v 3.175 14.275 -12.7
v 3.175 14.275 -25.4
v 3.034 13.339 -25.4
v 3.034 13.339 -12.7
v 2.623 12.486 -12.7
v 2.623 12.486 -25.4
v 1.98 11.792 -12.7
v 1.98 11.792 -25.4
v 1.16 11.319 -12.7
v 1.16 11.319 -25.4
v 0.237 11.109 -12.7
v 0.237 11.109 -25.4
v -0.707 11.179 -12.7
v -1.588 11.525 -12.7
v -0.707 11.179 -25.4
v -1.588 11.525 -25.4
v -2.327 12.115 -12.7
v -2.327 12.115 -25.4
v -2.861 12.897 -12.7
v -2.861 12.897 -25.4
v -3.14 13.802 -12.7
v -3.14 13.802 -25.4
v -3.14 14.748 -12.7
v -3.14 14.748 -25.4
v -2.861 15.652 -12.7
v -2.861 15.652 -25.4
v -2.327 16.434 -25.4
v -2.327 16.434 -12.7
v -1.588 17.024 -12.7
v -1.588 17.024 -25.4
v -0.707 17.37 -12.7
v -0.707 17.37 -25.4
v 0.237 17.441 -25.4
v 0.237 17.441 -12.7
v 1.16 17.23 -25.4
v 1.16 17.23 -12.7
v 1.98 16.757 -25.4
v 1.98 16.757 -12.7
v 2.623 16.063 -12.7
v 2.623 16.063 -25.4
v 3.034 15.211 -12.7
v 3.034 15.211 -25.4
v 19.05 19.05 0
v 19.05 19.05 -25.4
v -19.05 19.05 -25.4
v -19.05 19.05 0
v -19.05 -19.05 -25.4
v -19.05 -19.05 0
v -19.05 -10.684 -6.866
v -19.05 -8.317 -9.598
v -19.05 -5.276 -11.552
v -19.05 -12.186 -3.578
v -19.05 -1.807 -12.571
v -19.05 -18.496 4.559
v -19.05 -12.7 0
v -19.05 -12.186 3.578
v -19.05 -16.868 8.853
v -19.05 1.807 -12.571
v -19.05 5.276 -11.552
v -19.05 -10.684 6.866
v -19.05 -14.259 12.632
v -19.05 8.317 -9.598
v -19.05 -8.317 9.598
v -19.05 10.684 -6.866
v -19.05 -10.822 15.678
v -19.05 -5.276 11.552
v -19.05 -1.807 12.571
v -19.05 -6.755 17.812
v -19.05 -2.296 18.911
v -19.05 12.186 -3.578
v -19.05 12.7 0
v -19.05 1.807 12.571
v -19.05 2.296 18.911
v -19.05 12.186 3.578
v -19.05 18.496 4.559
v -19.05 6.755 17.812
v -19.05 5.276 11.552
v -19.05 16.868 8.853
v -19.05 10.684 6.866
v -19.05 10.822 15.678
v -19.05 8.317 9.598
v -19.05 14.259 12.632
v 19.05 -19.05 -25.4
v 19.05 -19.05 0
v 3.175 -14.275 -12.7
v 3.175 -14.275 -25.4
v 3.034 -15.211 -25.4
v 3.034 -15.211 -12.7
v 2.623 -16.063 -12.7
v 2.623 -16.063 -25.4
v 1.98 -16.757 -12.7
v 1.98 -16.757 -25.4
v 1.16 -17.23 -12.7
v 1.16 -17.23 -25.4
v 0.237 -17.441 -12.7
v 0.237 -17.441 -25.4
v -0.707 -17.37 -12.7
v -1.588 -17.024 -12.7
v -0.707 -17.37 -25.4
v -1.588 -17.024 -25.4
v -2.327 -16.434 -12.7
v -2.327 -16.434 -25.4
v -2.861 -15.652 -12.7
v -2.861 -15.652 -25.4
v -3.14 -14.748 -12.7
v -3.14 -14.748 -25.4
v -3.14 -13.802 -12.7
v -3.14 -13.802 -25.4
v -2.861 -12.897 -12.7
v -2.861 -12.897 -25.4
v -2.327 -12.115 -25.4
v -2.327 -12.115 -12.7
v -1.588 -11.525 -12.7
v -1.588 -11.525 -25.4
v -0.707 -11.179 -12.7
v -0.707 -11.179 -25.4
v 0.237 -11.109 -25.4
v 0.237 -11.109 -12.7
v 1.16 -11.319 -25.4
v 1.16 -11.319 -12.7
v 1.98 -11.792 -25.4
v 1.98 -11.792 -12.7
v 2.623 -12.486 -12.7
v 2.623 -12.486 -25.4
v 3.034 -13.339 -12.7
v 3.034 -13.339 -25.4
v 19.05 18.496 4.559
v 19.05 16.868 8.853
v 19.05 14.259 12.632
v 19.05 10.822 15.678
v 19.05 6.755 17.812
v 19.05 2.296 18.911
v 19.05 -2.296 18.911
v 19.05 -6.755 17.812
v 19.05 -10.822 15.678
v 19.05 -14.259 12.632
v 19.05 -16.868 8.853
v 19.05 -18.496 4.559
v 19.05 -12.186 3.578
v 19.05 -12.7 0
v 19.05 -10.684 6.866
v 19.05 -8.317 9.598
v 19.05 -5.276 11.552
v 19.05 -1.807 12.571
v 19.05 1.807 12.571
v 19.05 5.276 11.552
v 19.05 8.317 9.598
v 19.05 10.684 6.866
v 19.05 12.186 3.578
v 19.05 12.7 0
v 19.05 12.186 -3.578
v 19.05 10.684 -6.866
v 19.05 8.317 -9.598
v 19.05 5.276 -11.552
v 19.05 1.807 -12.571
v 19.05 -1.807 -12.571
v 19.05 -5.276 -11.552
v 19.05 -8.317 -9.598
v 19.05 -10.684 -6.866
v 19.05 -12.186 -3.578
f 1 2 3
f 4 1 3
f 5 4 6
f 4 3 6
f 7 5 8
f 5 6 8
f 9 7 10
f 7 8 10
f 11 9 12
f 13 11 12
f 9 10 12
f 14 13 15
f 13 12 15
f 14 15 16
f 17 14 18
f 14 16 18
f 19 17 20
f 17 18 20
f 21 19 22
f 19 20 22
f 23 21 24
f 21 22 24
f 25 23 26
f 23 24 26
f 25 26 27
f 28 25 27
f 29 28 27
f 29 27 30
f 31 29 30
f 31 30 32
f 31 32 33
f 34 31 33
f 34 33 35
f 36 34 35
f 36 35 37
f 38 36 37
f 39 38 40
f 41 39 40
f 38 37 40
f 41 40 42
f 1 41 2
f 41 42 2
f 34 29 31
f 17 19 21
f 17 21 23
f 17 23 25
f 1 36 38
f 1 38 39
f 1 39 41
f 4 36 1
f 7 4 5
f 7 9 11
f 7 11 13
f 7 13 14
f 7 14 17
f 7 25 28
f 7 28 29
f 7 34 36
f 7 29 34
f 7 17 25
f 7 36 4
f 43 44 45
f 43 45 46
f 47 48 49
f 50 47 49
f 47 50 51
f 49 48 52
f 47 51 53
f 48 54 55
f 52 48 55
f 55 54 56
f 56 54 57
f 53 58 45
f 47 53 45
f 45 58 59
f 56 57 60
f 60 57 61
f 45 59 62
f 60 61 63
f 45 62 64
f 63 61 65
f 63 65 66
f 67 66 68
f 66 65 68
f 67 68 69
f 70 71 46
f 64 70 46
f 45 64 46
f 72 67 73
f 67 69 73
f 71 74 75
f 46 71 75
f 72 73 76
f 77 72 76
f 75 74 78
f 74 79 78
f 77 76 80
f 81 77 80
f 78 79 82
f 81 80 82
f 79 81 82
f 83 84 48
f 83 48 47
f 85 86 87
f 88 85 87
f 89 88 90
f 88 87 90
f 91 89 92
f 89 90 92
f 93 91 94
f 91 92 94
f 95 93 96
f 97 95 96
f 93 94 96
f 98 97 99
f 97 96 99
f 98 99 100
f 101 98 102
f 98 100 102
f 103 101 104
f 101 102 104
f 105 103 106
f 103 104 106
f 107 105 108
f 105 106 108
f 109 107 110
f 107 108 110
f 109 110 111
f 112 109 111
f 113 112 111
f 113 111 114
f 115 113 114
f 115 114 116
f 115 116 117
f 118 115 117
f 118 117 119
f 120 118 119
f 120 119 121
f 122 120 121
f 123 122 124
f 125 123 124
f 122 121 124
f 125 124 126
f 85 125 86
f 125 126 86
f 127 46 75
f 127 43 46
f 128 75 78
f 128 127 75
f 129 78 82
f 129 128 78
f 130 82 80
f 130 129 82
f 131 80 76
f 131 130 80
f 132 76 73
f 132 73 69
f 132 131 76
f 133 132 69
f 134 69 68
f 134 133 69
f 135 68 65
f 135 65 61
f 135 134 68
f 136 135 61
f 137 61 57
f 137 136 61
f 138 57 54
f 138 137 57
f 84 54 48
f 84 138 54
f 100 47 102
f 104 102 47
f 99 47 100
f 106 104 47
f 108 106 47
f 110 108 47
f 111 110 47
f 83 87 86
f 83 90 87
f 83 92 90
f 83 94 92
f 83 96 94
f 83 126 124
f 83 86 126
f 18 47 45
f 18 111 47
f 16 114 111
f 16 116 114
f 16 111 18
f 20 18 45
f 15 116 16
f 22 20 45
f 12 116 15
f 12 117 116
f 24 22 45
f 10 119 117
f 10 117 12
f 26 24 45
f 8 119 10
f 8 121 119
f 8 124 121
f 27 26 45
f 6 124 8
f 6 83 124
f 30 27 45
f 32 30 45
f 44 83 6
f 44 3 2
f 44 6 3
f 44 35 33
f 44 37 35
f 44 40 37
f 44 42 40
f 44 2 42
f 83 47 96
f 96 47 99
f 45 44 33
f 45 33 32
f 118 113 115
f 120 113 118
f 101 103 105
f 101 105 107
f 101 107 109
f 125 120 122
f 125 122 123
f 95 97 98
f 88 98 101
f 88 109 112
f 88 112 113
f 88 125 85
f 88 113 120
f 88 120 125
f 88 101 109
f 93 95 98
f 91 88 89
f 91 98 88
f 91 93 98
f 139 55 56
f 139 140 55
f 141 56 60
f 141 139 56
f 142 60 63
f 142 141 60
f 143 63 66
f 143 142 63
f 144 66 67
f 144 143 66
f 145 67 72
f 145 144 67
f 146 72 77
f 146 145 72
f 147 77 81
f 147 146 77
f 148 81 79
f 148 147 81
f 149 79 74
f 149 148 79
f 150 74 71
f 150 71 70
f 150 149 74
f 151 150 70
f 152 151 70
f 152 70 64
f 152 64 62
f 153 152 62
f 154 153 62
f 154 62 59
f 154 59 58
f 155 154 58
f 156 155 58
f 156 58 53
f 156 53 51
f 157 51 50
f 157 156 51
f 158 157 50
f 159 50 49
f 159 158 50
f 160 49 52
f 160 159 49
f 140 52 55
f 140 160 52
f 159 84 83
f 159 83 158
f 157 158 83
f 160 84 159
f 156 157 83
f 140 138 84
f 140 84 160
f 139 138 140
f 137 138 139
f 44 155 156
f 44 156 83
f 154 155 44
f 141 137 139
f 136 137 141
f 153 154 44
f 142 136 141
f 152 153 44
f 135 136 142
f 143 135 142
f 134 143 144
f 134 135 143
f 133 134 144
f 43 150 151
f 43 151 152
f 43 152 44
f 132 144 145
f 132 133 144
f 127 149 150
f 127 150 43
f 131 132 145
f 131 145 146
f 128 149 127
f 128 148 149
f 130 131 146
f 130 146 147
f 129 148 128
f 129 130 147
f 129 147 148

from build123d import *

# Parameters (mm, degrees)
F1_DEPTH = 19.05
F2_R     = 3.175
F3_DEPTH = 12.7


with BuildPart() as f1:
    # F0 (on Right) → F1 (new body, symmetric)
    with BuildSketch(Plane.YZ):
        with BuildLine():
            Line((19.05, 0), (12.7, 0))
            ThreePointArc((12.7, 0), (0, -12.7), (-12.7, 0))
            Line((-12.7, 0), (-19.05, 0))
            ThreePointArc((-19.05, 0), (0, -19.05), (19.05, 0))
        make_face()
        with BuildLine():
            ThreePointArc((-12.7, 0), (0, 12.7), (12.7, 0))
            Line((12.7, 0), (19.05, 0))
            ThreePointArc((19.05, 0), (0, 19.05), (-19.05, 0))
            Line((-19.05, 0), (-12.7, 0))
        make_face()
        with BuildLine():
            Line((19.05, -25.4), (19.05, 0))
            ThreePointArc((19.05, 0), (0, -19.05), (-19.05, 0))
            Line((-19.05, 0), (-19.05, -25.4))
            Line((-19.05, -25.4), (19.05, -25.4))
        make_face()
    extrude(amount=F1_DEPTH, both=True)

    # F2 (on face) → F3 (cut)
    with BuildSketch(Plane(origin=(0, 0, -25.4), x_dir=(1, 0, 0), z_dir=(0, 0, -1))):
        with Locations((0, 14.2748)):
            Circle(F2_R)
        with Locations((0, -14.2748)):
            Circle(F2_R)
    extrude(amount=-F3_DEPTH, mode=Mode.SUBTRACT)


solid = f1.part
